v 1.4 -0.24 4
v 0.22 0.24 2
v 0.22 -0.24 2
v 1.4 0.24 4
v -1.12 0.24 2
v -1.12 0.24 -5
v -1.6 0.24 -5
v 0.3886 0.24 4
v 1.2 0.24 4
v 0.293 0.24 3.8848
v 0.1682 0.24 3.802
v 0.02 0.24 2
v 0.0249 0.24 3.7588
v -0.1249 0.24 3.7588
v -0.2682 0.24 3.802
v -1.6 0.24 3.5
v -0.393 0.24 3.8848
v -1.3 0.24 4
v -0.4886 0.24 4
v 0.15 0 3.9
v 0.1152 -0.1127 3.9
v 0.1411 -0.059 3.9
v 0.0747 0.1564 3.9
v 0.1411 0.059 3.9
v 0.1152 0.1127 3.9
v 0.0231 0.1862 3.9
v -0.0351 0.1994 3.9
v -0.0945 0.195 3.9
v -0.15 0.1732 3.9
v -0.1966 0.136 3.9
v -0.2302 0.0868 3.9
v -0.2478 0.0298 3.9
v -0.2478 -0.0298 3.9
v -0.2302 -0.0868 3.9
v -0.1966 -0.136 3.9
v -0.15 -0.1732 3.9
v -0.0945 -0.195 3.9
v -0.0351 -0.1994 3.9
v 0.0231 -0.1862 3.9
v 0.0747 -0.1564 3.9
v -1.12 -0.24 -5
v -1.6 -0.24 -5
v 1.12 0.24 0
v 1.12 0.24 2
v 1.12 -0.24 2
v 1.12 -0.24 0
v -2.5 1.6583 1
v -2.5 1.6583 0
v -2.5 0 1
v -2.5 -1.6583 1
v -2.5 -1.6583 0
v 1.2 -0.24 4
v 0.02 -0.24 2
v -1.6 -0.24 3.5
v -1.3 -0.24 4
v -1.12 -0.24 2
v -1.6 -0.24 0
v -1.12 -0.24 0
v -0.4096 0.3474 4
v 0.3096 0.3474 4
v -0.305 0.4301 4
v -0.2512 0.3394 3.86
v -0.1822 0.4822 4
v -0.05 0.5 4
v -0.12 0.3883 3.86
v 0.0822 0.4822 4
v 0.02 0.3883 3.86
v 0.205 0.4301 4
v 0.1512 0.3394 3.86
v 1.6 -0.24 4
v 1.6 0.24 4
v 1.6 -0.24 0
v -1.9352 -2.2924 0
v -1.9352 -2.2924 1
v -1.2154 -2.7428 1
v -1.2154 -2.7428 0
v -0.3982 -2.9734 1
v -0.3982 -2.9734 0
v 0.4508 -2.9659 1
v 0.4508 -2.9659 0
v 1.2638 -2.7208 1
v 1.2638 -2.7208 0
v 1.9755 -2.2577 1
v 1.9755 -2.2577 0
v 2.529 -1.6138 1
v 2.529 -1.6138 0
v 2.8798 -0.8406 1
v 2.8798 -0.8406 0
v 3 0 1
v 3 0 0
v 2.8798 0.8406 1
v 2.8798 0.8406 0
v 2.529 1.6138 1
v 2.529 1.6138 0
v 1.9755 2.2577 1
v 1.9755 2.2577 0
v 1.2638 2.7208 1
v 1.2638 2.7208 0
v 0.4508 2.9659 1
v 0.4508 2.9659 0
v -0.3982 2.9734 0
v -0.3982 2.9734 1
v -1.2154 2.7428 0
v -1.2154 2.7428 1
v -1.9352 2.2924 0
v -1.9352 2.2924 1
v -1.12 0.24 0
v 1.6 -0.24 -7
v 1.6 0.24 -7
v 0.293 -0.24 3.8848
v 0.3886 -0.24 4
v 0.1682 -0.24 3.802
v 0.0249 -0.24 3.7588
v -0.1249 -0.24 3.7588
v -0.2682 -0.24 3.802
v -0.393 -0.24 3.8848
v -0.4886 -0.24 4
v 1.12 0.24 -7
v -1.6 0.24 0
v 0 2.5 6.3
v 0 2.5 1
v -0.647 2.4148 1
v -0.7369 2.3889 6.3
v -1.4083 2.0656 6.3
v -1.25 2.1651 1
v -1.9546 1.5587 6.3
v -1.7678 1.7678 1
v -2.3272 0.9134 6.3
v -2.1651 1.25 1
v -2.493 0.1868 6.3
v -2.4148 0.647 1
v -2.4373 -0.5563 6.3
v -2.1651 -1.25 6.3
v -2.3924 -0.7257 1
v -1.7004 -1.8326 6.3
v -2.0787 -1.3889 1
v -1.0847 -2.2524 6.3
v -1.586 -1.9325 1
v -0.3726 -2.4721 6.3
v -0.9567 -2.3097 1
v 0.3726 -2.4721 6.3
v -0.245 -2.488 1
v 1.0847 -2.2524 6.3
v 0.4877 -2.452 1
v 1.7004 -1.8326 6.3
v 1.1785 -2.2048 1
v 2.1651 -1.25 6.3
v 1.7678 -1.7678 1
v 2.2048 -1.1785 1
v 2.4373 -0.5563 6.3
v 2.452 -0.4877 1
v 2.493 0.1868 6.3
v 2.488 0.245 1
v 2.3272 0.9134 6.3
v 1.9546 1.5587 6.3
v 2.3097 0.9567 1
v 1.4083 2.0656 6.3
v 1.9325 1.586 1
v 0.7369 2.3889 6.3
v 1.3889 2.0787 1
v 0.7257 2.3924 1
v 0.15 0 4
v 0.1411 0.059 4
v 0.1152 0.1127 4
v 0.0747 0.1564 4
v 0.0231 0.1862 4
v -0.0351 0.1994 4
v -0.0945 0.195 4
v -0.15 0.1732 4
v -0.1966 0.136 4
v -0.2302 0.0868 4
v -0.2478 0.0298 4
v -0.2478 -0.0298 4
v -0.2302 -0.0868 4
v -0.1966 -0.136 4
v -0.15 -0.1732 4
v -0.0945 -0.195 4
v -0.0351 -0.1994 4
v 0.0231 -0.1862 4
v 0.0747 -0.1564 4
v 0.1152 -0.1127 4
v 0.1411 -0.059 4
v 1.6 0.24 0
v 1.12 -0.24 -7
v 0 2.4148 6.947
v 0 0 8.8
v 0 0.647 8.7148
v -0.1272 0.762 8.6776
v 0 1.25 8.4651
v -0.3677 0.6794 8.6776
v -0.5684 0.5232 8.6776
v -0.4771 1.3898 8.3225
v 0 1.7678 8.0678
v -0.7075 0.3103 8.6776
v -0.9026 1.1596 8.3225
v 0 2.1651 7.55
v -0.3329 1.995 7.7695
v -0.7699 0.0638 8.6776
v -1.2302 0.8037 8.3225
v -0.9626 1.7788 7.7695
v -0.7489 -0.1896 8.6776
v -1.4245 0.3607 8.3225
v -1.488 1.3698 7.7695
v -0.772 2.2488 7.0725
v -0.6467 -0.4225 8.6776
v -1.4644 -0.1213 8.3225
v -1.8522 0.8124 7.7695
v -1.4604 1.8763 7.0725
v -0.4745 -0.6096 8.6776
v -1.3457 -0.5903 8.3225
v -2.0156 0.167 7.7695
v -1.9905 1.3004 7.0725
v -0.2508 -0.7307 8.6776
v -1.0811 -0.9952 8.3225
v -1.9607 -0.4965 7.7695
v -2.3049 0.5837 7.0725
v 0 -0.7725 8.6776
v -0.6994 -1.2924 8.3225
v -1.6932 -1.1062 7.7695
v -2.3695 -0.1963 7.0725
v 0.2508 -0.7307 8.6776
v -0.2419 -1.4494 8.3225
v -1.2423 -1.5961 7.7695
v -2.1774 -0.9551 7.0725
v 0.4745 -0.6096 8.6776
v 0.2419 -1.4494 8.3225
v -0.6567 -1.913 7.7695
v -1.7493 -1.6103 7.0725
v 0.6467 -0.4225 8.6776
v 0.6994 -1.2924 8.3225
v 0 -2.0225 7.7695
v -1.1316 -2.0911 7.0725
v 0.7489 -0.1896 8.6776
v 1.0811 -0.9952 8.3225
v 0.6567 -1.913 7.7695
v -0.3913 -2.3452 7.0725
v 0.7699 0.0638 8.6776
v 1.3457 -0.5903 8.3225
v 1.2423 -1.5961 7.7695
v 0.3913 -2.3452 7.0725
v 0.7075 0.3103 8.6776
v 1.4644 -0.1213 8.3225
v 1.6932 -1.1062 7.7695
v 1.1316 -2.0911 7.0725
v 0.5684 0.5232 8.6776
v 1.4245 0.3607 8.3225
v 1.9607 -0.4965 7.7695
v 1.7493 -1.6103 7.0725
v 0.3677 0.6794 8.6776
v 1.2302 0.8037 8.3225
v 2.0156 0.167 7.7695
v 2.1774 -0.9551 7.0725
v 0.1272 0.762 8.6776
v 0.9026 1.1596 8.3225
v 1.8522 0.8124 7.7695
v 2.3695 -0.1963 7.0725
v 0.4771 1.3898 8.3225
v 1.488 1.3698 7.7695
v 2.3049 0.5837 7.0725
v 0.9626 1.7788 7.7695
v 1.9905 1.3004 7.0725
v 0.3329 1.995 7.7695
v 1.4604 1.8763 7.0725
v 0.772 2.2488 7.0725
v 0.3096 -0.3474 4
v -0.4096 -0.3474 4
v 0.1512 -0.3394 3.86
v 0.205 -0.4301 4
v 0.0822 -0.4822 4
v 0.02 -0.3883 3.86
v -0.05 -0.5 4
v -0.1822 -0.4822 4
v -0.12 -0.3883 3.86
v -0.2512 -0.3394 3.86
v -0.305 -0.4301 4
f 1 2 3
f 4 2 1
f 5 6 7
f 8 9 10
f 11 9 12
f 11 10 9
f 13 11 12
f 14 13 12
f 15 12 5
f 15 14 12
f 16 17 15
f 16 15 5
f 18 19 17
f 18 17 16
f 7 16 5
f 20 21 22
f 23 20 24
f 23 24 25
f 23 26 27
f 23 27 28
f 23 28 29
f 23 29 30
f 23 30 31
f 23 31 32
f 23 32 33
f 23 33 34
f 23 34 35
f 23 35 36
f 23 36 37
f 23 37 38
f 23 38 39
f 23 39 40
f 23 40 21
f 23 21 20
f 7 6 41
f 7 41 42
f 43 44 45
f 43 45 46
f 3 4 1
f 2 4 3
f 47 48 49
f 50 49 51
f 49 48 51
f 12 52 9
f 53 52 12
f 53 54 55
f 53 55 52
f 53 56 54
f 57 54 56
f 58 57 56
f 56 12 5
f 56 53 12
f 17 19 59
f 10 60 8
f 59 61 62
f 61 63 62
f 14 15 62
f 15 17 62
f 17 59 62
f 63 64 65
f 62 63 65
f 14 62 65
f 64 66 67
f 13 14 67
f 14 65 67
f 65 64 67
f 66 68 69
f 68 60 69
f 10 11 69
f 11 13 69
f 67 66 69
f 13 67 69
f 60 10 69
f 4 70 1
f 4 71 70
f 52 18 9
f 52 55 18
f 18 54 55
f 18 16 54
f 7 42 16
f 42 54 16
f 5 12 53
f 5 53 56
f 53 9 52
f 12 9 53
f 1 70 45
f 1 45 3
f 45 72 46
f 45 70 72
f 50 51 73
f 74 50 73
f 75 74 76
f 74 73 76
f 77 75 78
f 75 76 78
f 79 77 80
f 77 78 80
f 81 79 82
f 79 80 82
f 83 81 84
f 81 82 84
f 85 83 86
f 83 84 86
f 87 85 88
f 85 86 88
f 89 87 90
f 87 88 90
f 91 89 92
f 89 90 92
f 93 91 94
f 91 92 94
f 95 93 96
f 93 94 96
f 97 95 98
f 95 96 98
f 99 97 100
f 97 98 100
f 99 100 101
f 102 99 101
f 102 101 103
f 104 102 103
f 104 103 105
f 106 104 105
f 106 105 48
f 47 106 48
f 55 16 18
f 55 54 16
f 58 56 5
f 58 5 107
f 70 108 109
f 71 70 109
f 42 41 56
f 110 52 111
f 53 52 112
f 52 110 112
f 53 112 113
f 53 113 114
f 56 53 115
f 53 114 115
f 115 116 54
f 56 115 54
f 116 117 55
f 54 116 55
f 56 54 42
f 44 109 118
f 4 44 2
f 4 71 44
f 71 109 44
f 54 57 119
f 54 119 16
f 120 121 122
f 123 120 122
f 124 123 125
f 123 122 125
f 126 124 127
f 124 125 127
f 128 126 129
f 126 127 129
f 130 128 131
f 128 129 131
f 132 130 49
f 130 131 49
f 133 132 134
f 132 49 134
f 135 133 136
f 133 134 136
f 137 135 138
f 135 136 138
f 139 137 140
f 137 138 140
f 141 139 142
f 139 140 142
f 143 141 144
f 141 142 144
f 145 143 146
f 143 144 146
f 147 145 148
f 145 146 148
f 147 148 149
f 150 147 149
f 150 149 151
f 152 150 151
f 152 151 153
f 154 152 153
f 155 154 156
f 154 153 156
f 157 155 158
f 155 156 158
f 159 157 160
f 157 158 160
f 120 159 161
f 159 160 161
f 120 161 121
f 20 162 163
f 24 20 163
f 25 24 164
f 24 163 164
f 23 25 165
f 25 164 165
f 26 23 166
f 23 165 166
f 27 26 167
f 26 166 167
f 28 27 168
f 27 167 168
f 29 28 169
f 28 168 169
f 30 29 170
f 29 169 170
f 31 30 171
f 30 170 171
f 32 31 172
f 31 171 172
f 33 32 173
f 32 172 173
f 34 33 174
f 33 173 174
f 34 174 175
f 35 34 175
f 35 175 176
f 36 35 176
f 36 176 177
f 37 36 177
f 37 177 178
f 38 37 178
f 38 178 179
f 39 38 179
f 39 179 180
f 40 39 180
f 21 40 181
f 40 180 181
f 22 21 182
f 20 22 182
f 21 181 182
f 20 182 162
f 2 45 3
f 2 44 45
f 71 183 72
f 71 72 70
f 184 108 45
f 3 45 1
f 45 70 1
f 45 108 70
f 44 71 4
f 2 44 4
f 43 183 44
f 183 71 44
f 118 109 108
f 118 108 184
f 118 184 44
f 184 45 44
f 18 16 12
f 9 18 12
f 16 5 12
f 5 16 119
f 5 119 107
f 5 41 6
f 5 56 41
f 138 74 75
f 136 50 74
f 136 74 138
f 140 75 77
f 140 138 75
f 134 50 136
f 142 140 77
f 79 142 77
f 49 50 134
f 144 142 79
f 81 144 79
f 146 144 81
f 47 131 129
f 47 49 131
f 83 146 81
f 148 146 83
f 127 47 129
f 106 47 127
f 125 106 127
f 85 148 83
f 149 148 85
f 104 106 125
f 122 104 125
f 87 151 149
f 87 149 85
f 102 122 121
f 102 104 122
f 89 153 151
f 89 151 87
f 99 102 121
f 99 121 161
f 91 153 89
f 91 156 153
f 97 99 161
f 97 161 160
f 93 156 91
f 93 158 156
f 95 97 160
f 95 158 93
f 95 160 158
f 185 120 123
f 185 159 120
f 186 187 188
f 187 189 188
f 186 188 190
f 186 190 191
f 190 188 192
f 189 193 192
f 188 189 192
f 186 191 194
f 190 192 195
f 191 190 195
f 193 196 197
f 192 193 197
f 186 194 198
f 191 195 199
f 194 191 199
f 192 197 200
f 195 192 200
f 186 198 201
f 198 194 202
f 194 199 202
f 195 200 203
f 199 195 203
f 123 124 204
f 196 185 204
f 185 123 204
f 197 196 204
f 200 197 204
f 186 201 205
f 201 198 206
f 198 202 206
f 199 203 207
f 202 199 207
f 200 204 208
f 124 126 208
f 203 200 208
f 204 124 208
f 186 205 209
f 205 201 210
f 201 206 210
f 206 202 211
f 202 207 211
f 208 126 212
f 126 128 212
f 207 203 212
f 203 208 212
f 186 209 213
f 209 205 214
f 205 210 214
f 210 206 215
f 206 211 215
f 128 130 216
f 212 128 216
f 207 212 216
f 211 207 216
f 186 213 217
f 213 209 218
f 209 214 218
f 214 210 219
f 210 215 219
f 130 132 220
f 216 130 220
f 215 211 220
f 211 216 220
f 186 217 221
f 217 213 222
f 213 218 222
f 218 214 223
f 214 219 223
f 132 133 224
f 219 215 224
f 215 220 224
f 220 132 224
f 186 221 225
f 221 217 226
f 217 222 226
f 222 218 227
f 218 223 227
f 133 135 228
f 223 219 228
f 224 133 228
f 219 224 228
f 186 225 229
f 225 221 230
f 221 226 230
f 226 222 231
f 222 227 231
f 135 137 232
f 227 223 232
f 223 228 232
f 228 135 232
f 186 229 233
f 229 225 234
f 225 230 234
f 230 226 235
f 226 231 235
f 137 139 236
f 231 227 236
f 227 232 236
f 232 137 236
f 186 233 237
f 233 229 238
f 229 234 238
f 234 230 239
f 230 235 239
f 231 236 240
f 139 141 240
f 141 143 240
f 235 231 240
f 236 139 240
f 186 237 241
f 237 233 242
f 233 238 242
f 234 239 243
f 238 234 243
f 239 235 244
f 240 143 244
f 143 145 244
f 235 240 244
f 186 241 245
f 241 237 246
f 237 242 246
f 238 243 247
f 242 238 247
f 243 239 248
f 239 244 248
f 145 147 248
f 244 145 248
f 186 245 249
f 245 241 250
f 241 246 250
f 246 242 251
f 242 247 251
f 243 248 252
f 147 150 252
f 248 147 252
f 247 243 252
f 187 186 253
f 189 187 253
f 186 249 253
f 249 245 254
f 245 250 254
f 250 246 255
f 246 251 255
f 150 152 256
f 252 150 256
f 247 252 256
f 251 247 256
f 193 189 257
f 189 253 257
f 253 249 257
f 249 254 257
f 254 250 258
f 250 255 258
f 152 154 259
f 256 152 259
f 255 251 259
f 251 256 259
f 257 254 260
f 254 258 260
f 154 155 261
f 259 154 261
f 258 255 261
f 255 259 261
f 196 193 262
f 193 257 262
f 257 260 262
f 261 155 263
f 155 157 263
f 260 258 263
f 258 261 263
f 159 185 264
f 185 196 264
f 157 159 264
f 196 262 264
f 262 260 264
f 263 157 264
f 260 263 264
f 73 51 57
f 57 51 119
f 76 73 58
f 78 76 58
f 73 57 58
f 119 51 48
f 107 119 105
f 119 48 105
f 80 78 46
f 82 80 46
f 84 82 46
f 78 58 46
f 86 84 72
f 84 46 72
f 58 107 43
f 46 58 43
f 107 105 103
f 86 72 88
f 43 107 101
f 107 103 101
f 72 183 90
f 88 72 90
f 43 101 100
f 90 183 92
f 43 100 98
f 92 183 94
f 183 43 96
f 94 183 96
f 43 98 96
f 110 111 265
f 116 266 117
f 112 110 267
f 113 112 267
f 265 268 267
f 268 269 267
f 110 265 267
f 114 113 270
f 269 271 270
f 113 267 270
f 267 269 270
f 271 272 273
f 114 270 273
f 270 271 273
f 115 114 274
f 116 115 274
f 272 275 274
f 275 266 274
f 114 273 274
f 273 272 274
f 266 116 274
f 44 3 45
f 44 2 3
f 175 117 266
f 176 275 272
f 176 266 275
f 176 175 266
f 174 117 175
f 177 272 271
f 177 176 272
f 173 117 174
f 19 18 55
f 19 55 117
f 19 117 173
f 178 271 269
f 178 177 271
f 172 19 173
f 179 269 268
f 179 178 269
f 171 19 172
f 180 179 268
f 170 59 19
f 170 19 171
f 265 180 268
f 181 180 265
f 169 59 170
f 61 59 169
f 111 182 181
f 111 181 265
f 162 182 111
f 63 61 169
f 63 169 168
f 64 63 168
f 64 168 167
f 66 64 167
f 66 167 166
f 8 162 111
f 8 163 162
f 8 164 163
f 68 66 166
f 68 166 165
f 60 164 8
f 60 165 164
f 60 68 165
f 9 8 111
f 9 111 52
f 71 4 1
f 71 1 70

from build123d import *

# Parameters (mm, degrees)
SKETCH1_R             = 3
BOSS_EXTRUDE1_DEPTH   = 1
CUT_EXTRUDE1_DEPTH    = 1
SKETCH4_W             = 0.48
SKETCH4_H             = 0.48
BOSS_EXTRUDE2_DEPTH   = 5
BOSS_EXTRUDE2_2_DEPTH = 5
SKETCH5_W             = 0.48
SKETCH5_H             = 0.48
BOSS_EXTRUDE3_DEPTH   = 2
CUT_EXTRUDE2_DEPTH    = 0.24
BOSS_EXTRUDE4_DEPTH   = 0.24
BOSS_EXTRUDE4_2_DEPTH = 0.24
SKETCH10_R            = 0.2
CUT_EXTRUDE3_DEPTH    = 0.1


with BuildPart() as part:
    # Sketch1 → Boss-Extrude1 (new body)
    with BuildSketch(Plane.XY):
        Circle(SKETCH1_R)
    extrude(amount=BOSS_EXTRUDE1_DEPTH)

    # Sketch2 → Revolve1 (revolve)
    with BuildSketch(Plane(origin=(0, 0, 0), x_dir=(0, 0, -1), z_dir=(1, 0, 0))):
        with BuildLine():
            Line((-1, 0), (-8.8, 0))
            ThreePointArc((-8.8, 0), (-8.067766953, 1.767766953), (-6.3, 2.5))
            Line((-6.3, 2.5), (-1, 2.5))
            Line((-1, 2.5), (-1, 0))
        make_face()
    revolve(axis=Axis((0, 0, 1), (0, 0, 1)))

    # Sketch3 → Cut-Extrude1 (cut)
    with BuildSketch(Plane(origin=(0, 0, 0), x_dir=(-1, 0, 0), z_dir=(0, 0, -1))):
        with BuildLine():
            Line((2.5, 1.658312395), (2.5, -1.658312395))
            ThreePointArc((2.5, -1.658312395), (3, 0), (2.5, 1.658312395))
        make_face()
    extrude(amount=-CUT_EXTRUDE1_DEPTH, mode=Mode.SUBTRACT)

    # Sketch6 → Cut-Extrude2 (cut, symmetric)
    with BuildSketch(Plane(origin=(0, 0, 0), x_dir=(1, 0, 0), z_dir=(0, 1, 0))):
        Polygon((-1.6, 0), (-1.6, -3.5), (-1.3, -4), (1.2, -4), (0.02, -2), (-1.12, -2), (-1.12, 0), align=None)
        Polygon((1.6, 0), (1.6, -4), (1.4, -4), (0.22, -2), (1.12, -2), (1.12, 0), align=None)
    extrude(amount=CUT_EXTRUDE2_DEPTH, both=True, mode=Mode.SUBTRACT)


with BuildPart() as body_2:
    # Sketch4 → Boss-Extrude2 (new body)
    with BuildSketch(Plane(origin=(0, 0, 0), x_dir=(-1, 0, 0), z_dir=(0, 0, -1))):
        with Locations((-1.36, 0)):
            Rectangle(SKETCH4_W, SKETCH4_H)
    extrude(amount=BOSS_EXTRUDE2_DEPTH)


with BuildPart() as body_3:
    # Sketch4 → Boss-Extrude2 2 (new body)
    with BuildSketch(Plane(origin=(0, 0, 0), x_dir=(-1, 0, 0), z_dir=(0, 0, -1))):
        with Locations((1.36, 0)):
            Rectangle(SKETCH4_W, SKETCH4_H)
    extrude(amount=BOSS_EXTRUDE2_2_DEPTH)


with BuildPart() as body_4:
    # Sketch5 → Boss-Extrude3 (new body)
    with BuildSketch(Plane(origin=(0, 0, -5), x_dir=(-1, 0, 0), z_dir=(0, 0, -1))):
        with Locations((-1.36, 0)):
            Rectangle(SKETCH5_W, SKETCH5_H)
    extrude(amount=BOSS_EXTRUDE3_DEPTH)


with BuildPart() as body_5:
    # Sketch7 → Boss-Extrude4 (new body, symmetric)
    with BuildSketch(Plane(origin=(0, 0, 0), x_dir=(1, 0, 0), z_dir=(0, 1, 0))):
        Polygon((-1.3, -4), (1.2, -4), (0.02, -2), (-1.12, -2), (-1.12, 0), (-1.6, 0), (-1.6, -3.5), align=None)
    extrude(amount=BOSS_EXTRUDE4_DEPTH, both=True)

    # Combine2: union body 3
    add(body_3.part)

    # Sketch8 → Cut-Revolve1 (revolve, cut)
    with BuildSketch(Plane(origin=(0, 0, 0), x_dir=(1, 0, 0), z_dir=(0, 1, 0))):
        with BuildLine():
            Line((-0.05, -4), (-0.05, -3.7))
            ThreePointArc((-0.05, -3.7), (-0.341547595, -3.780754009), (-0.55, -4))
            Line((-0.55, -4), (-0.05, -4))
        make_face()
    revolve(axis=Axis((-0.05, 0, 4), (0, 0, -1)), mode=Mode.SUBTRACT)


with BuildPart() as body_6:
    # Sketch7 → Boss-Extrude4 2 (new body, symmetric)
    with BuildSketch(Plane(origin=(0, 0, 0), x_dir=(1, 0, 0), z_dir=(0, 1, 0))):
        Polygon((0.22, -2), (1.4, -4), (1.6, -4), (1.6, 0), (1.12, 0), (1.12, -2), align=None)
    extrude(amount=BOSS_EXTRUDE4_2_DEPTH, both=True)

    # Combine1: union body 4, body 2
    add(body_4.part)
    add(body_2.part)


with BuildPart() as body_4_2:
    # Sketch9 → Revolve2 (revolve)
    with BuildSketch(Plane(origin=(0, 0, 0), x_dir=(1, 0, 0), z_dir=(0, 1, 0))):
        with BuildLine():
            Line((-0.55, -4), (-0.05, -4))
            Line((-0.05, -4), (-0.05, -3.7))
            ThreePointArc((-0.05, -3.7), (-0.341547595, -3.780754009), (-0.55, -4))
        make_face()
    revolve(axis=Axis((-0.05, 0, 4), (0, 0, -1)))

    # Combine3: union body 5
    add(body_5.part)

    # Sketch10 → Cut-Extrude3 (cut)
    with BuildSketch(Plane.XY.offset(4)):
        with Locations((-0.05, 0)):
            Circle(SKETCH10_R)
    extrude(amount=-CUT_EXTRUDE3_DEPTH, mode=Mode.SUBTRACT)


solid = Compound([part.part, body_6.part, body_4_2.part])
